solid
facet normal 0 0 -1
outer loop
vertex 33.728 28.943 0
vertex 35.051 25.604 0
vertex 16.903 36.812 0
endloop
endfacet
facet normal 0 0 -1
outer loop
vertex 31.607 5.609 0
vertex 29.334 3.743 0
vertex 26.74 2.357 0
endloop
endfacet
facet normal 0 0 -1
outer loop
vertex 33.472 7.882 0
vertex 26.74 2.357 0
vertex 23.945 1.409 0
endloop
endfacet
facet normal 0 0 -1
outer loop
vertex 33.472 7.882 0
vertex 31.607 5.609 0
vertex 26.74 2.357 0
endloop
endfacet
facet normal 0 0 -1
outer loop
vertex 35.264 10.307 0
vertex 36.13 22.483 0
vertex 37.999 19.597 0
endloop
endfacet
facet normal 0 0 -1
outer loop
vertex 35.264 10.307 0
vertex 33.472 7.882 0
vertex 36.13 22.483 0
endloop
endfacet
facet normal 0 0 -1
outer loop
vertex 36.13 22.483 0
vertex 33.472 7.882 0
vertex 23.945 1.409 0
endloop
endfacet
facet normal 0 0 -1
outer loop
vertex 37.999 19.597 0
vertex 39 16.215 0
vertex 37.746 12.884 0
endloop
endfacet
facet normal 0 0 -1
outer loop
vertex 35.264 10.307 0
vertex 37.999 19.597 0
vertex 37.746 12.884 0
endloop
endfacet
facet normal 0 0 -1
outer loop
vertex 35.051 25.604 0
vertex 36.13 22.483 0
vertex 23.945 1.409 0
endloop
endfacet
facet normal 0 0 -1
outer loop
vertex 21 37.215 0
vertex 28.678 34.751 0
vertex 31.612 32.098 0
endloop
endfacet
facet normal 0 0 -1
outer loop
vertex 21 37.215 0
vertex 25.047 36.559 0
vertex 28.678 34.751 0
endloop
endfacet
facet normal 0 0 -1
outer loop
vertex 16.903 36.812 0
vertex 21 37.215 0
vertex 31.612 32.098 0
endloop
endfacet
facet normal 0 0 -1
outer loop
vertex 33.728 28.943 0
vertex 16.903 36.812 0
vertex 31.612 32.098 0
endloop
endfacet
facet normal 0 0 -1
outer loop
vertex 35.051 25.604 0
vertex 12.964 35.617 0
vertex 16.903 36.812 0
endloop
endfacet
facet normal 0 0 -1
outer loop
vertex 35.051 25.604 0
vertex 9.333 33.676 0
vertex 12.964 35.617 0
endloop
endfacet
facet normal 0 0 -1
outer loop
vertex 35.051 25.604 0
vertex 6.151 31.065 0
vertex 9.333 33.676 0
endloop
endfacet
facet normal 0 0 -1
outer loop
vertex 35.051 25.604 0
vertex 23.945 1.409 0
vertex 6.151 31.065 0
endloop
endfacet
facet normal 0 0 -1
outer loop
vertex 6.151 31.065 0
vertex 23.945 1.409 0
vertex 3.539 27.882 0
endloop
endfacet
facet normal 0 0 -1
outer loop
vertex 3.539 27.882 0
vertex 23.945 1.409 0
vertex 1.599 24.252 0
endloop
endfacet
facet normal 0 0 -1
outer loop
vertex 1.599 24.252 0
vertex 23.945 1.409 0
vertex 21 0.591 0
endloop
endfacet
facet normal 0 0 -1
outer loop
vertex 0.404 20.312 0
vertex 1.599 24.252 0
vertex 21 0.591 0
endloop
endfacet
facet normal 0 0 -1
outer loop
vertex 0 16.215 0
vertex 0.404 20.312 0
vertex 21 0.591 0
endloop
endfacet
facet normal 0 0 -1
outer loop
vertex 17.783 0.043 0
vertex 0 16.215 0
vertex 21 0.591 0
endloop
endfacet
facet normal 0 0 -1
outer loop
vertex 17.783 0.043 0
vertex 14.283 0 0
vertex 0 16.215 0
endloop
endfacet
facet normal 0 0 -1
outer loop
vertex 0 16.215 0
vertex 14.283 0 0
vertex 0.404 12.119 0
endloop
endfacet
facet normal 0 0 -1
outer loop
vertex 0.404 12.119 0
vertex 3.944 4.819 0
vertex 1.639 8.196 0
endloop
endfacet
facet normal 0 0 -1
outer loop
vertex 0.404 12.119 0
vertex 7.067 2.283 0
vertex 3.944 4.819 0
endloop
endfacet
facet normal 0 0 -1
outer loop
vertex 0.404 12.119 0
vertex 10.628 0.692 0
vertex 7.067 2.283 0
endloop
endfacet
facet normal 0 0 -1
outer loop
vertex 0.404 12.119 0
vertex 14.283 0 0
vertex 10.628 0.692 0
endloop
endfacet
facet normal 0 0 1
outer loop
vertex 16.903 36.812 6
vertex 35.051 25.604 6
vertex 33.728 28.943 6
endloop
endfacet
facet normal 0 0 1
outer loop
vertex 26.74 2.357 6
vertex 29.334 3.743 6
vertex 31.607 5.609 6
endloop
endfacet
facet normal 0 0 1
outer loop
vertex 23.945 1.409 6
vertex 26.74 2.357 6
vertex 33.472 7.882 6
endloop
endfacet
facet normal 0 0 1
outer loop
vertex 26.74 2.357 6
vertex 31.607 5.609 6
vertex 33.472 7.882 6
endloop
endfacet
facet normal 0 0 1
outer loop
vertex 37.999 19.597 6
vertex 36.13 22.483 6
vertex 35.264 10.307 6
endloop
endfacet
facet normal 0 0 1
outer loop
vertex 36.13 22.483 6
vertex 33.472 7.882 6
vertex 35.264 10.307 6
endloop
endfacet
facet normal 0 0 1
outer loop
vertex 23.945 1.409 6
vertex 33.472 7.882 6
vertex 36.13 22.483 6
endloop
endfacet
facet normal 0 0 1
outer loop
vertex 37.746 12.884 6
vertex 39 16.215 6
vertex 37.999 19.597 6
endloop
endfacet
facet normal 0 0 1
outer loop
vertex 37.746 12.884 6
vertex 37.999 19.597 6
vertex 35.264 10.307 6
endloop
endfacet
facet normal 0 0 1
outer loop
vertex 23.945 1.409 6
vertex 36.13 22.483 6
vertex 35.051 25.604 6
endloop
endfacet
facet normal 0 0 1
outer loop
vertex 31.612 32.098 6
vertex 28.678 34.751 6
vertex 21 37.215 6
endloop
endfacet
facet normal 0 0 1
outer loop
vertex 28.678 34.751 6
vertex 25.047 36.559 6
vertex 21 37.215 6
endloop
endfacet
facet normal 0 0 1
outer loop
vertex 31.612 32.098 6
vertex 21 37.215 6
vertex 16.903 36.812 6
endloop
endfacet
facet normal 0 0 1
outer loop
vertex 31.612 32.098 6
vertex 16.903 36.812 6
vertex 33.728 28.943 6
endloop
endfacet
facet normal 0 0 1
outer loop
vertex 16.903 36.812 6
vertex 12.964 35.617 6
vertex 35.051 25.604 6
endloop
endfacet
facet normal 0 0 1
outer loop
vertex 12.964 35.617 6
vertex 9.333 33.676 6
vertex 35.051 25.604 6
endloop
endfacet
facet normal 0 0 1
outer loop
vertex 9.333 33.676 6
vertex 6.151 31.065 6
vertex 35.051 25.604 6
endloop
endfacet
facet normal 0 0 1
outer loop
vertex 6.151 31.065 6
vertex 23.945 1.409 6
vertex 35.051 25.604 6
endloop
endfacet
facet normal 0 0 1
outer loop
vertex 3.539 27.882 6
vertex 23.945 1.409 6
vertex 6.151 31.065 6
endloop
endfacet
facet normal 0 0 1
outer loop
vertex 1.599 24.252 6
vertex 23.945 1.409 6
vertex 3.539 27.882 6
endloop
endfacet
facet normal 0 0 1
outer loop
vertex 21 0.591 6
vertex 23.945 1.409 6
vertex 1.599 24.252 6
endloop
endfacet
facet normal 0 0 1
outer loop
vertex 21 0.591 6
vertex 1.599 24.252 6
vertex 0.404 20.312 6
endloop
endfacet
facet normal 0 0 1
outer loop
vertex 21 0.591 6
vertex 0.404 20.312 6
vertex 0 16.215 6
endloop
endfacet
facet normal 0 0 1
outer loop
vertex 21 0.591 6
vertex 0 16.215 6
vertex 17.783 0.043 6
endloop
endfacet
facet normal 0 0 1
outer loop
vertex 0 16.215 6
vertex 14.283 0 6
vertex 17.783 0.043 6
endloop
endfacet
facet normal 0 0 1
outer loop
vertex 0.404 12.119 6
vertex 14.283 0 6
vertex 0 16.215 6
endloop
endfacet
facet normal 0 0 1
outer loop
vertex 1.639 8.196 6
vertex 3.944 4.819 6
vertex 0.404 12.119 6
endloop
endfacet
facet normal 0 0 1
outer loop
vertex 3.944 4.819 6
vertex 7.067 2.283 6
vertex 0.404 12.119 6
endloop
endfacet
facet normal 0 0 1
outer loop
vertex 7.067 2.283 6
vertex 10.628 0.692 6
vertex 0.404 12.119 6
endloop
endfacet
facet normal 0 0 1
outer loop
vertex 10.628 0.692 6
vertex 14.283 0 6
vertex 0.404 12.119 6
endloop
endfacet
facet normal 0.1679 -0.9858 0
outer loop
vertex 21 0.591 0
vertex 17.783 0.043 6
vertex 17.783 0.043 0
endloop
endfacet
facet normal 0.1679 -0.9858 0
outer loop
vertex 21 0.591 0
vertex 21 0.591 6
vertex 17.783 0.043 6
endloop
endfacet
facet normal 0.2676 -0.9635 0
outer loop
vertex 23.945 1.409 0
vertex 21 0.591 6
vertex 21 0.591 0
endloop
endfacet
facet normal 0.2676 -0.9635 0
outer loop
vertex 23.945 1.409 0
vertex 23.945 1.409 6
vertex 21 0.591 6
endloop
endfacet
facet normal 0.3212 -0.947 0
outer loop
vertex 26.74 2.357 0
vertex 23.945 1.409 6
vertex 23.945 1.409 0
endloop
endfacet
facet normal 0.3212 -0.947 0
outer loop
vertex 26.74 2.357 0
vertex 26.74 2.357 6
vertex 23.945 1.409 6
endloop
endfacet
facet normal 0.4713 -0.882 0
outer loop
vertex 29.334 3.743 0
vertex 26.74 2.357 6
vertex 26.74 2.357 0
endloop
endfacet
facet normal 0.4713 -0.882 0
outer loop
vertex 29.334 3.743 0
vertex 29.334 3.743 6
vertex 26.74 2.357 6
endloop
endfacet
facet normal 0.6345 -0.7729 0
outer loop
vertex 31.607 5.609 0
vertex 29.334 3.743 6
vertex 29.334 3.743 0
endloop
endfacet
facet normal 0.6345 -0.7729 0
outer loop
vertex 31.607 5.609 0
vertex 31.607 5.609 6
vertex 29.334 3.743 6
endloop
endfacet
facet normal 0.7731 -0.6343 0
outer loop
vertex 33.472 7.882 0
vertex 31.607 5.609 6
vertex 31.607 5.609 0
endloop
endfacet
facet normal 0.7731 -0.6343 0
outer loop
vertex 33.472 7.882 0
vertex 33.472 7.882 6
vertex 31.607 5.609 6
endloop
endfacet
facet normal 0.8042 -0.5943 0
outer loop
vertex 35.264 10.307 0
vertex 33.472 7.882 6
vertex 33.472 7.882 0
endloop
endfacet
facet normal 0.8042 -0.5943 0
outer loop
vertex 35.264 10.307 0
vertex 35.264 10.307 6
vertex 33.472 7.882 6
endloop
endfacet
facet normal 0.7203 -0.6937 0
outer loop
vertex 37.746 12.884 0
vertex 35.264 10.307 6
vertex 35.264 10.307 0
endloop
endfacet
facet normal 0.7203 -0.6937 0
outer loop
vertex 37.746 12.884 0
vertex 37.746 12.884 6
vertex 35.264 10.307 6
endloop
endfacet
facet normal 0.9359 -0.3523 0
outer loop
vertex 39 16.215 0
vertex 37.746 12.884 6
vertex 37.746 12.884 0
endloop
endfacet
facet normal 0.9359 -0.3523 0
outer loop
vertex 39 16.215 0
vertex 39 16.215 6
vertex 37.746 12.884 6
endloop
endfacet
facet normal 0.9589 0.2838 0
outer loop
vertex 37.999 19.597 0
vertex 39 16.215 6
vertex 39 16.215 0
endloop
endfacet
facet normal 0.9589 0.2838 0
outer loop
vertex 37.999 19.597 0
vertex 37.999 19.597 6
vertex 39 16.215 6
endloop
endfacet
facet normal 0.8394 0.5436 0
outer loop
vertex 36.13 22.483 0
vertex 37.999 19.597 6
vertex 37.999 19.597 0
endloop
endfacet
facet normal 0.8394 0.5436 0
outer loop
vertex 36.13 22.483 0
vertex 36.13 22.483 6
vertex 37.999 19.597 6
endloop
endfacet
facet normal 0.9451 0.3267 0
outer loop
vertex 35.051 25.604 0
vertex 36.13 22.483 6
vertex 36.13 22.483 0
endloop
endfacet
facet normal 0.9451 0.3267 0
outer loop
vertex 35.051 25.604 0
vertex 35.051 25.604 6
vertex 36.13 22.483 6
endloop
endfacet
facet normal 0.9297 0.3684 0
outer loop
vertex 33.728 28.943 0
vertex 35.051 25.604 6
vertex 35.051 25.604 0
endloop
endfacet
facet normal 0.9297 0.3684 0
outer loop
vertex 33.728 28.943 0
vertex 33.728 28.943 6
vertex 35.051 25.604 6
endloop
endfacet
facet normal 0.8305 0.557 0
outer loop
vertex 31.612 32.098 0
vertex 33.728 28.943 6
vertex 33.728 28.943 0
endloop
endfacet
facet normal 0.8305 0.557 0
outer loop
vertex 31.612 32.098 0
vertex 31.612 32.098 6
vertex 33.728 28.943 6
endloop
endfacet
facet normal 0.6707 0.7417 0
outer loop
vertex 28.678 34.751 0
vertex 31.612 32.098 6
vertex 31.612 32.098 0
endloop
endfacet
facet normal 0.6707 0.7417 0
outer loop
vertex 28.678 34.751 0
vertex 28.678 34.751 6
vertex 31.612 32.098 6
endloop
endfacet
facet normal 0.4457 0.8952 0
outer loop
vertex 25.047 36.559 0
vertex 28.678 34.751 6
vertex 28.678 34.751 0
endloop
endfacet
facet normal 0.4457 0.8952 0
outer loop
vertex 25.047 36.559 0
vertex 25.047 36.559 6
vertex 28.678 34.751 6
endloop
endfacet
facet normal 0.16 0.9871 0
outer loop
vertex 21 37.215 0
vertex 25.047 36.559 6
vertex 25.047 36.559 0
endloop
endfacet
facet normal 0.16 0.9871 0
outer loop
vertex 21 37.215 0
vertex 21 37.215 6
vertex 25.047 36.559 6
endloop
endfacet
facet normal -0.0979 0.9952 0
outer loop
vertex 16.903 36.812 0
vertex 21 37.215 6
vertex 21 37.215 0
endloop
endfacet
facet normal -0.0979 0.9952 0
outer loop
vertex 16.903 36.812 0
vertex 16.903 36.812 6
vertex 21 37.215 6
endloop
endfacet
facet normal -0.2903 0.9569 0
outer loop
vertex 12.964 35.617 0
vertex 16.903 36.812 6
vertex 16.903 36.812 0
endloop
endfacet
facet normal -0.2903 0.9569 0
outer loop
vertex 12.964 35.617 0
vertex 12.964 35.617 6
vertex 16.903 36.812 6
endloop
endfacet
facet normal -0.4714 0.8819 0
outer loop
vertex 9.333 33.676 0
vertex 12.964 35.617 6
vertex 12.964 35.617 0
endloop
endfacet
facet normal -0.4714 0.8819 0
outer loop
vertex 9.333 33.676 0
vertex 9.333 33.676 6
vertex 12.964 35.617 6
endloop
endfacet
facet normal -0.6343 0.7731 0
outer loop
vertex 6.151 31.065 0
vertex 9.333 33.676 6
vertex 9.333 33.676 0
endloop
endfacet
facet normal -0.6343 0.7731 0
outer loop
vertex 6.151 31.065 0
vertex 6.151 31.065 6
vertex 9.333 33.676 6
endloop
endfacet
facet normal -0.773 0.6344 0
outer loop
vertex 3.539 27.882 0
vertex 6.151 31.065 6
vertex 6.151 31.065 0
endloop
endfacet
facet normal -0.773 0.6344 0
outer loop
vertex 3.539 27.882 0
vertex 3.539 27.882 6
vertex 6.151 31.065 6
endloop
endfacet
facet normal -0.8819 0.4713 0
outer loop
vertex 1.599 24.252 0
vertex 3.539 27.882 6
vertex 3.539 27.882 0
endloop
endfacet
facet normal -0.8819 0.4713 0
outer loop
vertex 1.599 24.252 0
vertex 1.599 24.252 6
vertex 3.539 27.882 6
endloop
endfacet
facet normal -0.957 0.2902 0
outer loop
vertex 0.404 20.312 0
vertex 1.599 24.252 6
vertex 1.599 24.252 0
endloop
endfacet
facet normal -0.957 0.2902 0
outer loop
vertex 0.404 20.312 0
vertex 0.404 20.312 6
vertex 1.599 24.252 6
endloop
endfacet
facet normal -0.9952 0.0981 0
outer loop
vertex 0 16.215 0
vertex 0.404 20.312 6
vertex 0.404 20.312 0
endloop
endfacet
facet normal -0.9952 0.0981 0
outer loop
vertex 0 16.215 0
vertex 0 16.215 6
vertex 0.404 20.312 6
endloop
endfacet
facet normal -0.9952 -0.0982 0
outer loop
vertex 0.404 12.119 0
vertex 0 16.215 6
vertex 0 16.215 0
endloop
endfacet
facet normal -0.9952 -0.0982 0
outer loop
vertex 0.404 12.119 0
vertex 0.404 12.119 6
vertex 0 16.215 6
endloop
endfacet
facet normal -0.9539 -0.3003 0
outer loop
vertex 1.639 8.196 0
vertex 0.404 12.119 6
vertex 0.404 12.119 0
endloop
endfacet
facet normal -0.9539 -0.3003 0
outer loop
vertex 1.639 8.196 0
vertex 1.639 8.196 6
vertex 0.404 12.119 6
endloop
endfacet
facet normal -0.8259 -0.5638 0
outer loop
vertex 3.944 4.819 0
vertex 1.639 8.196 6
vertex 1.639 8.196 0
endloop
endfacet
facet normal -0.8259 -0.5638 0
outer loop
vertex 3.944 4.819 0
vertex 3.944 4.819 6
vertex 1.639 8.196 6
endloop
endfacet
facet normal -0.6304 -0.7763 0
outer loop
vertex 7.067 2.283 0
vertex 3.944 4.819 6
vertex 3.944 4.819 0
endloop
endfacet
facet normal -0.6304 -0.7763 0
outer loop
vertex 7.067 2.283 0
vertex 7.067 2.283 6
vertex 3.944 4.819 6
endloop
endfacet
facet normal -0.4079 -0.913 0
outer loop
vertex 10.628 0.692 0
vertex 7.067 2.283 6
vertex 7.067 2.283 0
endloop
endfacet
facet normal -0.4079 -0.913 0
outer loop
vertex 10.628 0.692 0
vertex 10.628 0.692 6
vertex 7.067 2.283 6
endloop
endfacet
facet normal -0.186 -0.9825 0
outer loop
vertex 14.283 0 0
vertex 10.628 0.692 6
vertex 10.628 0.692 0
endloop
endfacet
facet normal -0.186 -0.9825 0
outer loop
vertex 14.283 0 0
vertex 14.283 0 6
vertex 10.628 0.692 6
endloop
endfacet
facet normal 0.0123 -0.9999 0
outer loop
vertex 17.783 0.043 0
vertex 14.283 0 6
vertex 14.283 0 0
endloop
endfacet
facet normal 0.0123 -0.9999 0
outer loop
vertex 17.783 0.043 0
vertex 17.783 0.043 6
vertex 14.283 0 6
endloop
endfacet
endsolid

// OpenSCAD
$fn = 32;

// ----------------------------------------------------------------------
// Cam disc: base radius 15.0 mm, lift 6.0 mm, 32 profile points
// ----------------------------------------------------------------------

// --- parameters (mm) ---
profile_height = 6;       // extrusion height
profile_points = 32;      // points of the closed outline

profile = [[39, 16.215], [37.999, 19.597], [36.13, 22.483], [35.051, 25.604], [33.728, 28.943], [31.612, 32.098], [28.678, 34.751], [25.047, 36.559], [21, 37.215], [16.903, 36.812], [12.964, 35.617], [9.333, 33.676], [6.151, 31.065], [3.539, 27.882], [1.599, 24.252], [0.404, 20.312], [0, 16.215], [0.404, 12.119], [1.639, 8.196], [3.944, 4.819], [7.067, 2.283], [10.628, 0.692], [14.283, 0], [17.783, 0.043], [21, 0.591], [23.945, 1.409], [26.74, 2.357], [29.334, 3.743], [31.607, 5.609], [33.472, 7.882], [35.264, 10.307], [37.746, 12.884]];  // single closed polygon, 32 points, counter clockwise

// --- the one profile operation ---
linear_extrude(height = profile_height) polygon(points = profile);
